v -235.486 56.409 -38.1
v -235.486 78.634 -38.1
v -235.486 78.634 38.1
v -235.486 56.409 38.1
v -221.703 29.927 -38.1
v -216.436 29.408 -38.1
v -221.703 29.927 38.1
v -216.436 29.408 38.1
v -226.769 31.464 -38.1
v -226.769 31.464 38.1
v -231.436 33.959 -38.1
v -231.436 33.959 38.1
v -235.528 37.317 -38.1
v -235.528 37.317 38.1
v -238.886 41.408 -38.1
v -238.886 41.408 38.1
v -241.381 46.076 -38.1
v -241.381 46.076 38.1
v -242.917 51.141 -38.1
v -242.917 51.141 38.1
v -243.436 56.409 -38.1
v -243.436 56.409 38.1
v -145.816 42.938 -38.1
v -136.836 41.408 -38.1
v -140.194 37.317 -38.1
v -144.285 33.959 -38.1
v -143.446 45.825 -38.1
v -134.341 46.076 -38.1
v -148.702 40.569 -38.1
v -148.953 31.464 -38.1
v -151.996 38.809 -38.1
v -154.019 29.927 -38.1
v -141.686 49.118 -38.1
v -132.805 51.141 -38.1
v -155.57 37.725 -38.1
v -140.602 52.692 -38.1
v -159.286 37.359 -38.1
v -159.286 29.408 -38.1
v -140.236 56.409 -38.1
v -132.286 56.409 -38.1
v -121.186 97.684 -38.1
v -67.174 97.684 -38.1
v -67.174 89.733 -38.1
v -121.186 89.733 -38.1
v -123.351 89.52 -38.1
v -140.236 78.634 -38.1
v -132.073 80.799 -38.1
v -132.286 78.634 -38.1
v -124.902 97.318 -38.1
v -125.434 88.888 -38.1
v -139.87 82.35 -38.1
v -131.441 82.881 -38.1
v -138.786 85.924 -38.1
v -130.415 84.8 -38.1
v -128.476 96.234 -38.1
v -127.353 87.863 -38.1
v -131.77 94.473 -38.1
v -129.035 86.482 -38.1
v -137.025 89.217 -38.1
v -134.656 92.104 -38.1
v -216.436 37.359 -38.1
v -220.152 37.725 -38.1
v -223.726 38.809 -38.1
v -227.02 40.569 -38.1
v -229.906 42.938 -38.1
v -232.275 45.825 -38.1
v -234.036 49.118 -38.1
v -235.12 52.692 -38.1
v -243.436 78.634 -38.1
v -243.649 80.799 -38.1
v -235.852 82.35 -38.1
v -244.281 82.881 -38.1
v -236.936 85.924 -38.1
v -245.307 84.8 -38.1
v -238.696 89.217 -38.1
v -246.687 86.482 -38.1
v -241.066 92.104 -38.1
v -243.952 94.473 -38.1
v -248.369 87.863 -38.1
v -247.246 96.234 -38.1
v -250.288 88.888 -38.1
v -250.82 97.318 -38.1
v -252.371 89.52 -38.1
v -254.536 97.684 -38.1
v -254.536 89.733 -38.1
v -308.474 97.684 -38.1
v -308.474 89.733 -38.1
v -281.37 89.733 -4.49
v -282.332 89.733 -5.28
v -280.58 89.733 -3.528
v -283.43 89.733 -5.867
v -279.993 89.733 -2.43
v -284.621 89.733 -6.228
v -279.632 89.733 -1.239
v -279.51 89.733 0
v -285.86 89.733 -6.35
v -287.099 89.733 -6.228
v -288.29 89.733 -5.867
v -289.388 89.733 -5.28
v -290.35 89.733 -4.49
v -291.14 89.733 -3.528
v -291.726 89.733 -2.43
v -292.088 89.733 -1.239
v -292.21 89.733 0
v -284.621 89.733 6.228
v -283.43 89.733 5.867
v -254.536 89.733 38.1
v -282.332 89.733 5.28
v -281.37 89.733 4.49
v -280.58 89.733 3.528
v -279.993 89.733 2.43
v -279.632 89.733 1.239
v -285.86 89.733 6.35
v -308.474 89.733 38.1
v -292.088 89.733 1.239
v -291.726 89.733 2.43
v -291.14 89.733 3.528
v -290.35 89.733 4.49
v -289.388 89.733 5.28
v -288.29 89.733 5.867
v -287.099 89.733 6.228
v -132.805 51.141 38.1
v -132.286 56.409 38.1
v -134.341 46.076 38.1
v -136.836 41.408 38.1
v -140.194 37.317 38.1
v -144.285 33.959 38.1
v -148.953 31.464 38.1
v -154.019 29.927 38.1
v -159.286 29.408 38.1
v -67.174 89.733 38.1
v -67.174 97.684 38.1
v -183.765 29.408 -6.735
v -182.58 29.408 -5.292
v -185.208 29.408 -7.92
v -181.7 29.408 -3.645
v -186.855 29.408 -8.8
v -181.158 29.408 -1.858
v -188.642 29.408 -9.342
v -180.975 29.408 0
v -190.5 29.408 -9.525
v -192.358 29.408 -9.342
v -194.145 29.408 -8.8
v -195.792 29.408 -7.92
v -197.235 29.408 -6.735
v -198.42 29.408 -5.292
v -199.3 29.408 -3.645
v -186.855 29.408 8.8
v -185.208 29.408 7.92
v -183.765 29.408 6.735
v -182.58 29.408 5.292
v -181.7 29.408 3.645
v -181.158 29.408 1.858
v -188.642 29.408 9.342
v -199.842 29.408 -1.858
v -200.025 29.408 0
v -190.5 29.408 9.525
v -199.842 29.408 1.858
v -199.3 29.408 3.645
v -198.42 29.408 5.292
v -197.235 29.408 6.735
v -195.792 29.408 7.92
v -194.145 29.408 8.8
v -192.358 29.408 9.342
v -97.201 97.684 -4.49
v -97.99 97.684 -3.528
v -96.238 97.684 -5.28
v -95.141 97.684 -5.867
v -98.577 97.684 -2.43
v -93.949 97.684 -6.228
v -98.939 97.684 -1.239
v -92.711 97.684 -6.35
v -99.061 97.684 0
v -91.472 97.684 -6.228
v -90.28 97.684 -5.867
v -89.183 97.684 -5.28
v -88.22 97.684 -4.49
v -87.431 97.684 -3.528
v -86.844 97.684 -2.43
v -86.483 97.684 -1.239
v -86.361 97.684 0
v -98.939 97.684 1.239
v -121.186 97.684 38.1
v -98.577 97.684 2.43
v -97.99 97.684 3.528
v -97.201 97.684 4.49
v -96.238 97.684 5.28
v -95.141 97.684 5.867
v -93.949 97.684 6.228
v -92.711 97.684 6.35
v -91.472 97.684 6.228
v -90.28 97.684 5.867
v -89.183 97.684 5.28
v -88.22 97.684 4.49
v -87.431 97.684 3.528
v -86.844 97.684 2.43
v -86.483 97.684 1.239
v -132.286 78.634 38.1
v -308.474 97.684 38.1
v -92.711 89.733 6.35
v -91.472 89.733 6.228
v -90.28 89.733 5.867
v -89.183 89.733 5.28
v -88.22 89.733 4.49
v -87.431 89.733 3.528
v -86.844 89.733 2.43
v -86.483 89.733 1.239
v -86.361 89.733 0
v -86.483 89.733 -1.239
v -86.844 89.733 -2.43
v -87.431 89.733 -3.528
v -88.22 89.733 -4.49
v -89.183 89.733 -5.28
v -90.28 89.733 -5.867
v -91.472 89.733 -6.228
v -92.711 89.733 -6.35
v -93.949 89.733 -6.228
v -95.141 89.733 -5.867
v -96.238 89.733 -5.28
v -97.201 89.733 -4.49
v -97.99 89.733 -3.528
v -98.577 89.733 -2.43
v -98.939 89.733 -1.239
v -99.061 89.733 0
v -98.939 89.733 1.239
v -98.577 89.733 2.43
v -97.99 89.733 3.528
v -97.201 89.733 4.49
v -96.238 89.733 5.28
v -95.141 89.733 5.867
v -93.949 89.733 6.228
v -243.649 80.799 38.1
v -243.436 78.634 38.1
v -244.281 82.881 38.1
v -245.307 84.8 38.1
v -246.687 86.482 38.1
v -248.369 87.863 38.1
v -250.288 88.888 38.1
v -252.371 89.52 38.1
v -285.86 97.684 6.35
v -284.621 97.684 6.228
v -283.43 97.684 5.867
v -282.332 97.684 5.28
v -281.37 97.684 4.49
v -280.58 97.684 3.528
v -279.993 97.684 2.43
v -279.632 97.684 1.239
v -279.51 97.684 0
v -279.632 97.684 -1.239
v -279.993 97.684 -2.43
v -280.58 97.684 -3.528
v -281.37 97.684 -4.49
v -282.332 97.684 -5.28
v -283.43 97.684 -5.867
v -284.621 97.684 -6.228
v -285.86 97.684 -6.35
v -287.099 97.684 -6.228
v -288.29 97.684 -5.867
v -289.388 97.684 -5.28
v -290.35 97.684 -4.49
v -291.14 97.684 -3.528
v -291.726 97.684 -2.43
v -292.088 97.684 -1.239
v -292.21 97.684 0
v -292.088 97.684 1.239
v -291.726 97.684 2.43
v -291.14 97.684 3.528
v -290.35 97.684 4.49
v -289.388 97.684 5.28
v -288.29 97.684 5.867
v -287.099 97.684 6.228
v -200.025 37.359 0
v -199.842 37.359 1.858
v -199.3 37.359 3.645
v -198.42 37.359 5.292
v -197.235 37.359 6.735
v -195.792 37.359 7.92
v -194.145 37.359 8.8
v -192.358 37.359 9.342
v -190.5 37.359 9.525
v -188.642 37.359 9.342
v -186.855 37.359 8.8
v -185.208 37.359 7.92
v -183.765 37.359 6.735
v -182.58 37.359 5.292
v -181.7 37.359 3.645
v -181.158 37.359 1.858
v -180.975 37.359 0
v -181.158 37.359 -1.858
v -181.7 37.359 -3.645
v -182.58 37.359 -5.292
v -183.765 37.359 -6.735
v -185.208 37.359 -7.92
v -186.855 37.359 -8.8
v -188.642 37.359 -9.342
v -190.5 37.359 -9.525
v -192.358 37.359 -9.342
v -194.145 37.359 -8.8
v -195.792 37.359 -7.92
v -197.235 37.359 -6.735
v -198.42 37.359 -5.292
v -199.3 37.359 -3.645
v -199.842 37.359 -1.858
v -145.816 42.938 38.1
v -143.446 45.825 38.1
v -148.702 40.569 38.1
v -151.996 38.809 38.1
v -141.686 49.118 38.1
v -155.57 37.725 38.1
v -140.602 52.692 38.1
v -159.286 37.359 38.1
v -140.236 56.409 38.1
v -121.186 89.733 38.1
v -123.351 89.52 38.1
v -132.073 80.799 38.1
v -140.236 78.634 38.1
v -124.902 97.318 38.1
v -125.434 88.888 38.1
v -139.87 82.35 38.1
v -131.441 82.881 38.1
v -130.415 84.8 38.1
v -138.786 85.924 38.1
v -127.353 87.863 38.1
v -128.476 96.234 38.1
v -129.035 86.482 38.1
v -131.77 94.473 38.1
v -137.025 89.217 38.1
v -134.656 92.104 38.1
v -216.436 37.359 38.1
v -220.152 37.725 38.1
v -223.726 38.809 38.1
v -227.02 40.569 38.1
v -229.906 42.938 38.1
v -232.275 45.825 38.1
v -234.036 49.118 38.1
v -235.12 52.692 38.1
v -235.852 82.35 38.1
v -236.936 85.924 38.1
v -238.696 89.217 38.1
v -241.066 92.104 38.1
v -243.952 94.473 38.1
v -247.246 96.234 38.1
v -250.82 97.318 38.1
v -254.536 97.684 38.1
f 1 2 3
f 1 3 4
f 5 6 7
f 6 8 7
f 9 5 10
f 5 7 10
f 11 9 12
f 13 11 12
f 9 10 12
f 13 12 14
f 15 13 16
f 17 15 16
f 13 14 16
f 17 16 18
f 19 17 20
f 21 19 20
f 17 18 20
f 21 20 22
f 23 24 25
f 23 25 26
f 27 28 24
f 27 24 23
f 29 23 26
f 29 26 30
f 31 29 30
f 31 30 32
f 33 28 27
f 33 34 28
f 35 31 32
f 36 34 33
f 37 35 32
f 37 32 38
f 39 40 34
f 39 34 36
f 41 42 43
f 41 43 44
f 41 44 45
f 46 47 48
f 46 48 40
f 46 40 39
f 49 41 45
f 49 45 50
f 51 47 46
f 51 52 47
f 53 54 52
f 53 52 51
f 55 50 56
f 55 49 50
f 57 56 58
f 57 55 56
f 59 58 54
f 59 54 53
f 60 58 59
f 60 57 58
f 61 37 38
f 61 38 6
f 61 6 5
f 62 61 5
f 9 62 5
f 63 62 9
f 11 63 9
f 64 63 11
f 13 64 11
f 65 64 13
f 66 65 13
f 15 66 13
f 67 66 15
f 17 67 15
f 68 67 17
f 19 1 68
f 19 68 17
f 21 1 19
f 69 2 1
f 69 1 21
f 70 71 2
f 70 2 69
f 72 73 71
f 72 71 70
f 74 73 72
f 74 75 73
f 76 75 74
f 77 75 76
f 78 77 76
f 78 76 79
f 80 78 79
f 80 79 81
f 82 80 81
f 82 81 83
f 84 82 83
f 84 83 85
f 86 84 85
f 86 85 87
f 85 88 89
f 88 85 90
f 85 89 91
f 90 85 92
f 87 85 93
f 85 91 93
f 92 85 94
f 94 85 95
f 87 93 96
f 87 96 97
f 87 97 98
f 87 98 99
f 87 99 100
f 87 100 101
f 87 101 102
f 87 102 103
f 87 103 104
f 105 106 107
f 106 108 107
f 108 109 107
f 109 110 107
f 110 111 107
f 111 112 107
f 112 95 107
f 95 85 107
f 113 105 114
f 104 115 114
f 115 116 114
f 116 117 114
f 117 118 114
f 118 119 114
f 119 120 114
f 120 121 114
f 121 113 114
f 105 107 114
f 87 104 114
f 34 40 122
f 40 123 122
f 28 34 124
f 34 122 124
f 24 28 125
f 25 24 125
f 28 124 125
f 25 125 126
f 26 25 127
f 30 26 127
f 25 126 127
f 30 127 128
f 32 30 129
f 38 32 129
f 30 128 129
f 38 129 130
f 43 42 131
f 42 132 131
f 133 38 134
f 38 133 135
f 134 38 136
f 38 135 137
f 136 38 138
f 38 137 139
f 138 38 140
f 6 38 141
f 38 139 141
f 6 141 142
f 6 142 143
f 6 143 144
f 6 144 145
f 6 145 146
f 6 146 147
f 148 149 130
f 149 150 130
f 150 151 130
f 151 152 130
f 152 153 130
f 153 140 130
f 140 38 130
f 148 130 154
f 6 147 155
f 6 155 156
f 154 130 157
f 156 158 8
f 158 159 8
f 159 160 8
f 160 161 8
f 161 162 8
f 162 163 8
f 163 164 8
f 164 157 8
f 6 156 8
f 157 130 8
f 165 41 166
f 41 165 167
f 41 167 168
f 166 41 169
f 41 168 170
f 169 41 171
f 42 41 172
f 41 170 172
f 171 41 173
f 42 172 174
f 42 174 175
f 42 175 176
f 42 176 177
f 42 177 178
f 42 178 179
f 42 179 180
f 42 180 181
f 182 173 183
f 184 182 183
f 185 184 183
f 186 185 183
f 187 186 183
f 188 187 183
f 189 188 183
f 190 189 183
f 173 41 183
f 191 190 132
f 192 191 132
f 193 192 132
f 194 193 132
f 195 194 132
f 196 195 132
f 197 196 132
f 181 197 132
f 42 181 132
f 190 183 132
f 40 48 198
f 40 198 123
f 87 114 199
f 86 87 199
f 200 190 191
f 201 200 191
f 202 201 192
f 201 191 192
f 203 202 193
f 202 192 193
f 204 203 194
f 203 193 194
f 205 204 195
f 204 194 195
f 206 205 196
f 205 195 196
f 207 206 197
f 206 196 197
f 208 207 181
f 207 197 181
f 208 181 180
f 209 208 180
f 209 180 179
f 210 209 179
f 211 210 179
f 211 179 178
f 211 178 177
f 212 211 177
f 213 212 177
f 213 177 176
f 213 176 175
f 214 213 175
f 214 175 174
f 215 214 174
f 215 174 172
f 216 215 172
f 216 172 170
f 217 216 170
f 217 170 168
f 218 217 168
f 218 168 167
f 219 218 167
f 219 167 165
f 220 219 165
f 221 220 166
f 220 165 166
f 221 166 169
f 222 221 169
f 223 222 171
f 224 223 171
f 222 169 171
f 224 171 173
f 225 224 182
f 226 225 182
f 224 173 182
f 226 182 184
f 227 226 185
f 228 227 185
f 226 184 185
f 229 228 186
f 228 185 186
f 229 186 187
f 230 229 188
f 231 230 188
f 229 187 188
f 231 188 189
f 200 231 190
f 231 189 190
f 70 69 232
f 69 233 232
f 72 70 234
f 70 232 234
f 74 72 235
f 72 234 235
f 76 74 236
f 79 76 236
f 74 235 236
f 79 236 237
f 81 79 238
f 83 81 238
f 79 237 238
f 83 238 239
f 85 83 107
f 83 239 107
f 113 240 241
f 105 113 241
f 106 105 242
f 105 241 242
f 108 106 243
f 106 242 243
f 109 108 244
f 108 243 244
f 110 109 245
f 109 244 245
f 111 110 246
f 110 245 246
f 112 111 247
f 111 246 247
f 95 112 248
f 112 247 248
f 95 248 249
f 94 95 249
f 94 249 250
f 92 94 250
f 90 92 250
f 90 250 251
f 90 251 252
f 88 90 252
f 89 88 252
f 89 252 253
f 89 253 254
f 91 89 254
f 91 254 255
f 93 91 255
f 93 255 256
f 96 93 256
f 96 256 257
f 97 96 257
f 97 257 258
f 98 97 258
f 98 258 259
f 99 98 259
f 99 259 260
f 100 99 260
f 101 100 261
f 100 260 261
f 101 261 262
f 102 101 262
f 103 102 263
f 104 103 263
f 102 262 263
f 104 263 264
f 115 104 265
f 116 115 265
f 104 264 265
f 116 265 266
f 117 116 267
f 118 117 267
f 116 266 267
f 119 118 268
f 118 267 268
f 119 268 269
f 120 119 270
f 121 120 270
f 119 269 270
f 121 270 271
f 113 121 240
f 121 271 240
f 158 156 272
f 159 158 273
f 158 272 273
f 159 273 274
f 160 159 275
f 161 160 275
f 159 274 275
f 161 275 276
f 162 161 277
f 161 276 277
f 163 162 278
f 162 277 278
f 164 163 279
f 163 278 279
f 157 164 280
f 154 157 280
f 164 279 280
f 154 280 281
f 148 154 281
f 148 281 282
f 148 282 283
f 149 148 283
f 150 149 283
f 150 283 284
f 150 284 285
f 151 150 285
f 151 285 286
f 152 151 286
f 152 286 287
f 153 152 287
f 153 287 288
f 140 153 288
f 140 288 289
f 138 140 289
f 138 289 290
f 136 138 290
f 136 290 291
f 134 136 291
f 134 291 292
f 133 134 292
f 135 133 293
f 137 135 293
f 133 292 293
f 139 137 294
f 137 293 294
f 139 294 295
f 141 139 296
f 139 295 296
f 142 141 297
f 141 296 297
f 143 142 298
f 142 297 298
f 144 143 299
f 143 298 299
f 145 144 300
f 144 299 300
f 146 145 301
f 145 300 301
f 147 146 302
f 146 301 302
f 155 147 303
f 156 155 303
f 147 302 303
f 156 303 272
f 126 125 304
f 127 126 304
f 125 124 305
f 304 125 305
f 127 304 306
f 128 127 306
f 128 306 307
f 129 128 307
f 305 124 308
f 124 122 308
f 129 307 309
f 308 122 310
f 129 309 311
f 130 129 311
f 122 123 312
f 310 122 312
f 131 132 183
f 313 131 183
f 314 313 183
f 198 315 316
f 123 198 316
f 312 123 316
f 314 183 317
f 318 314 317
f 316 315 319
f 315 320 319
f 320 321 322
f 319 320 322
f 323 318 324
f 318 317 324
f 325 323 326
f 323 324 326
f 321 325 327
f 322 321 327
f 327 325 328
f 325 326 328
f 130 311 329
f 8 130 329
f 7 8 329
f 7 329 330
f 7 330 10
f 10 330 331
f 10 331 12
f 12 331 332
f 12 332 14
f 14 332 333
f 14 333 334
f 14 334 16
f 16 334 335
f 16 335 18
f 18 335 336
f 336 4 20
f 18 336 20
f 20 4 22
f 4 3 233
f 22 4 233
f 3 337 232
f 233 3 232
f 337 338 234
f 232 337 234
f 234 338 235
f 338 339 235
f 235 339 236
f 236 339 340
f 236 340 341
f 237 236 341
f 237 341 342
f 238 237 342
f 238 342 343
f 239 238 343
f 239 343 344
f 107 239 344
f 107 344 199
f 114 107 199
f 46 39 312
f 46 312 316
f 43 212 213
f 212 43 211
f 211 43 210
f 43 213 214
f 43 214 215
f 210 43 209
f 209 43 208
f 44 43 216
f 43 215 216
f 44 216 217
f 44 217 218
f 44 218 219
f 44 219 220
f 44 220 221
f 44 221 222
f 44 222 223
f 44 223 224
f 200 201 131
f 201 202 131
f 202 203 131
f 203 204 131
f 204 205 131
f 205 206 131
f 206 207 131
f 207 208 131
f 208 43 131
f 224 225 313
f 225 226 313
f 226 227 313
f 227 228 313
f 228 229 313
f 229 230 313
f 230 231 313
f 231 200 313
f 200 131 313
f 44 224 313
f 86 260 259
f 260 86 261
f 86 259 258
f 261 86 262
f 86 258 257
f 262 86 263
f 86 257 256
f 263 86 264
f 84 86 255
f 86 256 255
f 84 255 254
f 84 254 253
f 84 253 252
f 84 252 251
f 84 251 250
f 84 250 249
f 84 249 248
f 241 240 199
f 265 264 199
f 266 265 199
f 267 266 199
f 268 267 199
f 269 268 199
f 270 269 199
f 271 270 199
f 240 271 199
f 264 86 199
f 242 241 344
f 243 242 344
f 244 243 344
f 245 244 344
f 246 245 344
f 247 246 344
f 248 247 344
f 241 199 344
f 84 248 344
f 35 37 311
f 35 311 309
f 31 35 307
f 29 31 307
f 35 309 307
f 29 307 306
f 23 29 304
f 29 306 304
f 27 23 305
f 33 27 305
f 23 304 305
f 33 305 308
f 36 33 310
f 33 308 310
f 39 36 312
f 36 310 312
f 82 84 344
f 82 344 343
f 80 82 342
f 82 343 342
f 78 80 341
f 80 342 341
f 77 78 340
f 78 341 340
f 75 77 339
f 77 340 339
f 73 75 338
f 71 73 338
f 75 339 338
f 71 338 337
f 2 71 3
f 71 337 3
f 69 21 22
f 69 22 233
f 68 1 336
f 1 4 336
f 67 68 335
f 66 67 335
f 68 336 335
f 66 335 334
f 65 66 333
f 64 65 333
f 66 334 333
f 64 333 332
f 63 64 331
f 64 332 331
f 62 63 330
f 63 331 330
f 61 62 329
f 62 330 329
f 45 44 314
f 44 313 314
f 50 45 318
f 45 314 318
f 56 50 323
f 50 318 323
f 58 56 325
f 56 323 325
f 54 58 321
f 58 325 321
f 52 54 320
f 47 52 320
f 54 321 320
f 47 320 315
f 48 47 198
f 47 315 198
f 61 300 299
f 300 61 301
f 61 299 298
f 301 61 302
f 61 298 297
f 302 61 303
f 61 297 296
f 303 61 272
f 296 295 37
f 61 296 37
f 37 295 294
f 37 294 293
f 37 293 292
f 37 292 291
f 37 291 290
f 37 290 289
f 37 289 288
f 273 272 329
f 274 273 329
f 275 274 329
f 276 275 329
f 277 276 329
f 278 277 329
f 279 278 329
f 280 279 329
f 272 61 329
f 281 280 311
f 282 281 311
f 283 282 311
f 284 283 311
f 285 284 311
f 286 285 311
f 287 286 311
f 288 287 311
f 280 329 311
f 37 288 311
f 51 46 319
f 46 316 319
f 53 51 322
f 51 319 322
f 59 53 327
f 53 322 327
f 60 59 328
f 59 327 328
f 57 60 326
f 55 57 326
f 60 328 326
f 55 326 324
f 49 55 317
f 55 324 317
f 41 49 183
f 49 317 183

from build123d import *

# Parameters (mm, degrees)
BOSS_EXTRUDE1_DEPTH = 38.1
SKETCH4_R           = 9.525
SKETCH4_R_2         = 6.35
CUT_EXTRUDE1_DEPTH  = 76.2


with BuildPart() as part:
    # Sketch3 → Boss-Extrude1 (new, symmetric)
    with BuildSketch(Plane.XY):
        with BuildLine():
            Line((-308.473797305, 97.683602722), (-254.535984299, 97.683602722))
            ThreePointArc((-254.535984299, 97.683602722), (-241.065600117, 92.103986904), (-235.485984299, 78.633602722))
            Line((-235.485984299, 78.633602722), (-235.485984299, 56.408602722))
            ThreePointArc((-235.485984299, 56.408602722), (-229.90636848, 42.938218541), (-216.435984299, 37.358602722))
            Line((-216.435984299, 37.358602722), (-159.285984299, 37.358602722))
            ThreePointArc((-159.285984299, 37.358602722), (-145.815600117, 42.938218541), (-140.235984299, 56.408602722))
            Line((-140.235984299, 56.408602722), (-140.235984299, 78.633602722))
            ThreePointArc((-140.235984299, 78.633602722), (-134.65636848, 92.103986904), (-121.185984299, 97.683602722))
            Line((-121.185984299, 97.683602722), (-67.173797305, 97.683602722))
            Line((-67.173797305, 97.683602722), (-67.173797305, 89.733402722))
            Line((-67.173797305, 89.733402722), (-121.185984299, 89.733402722))
            ThreePointArc((-121.185984299, 89.733402722), (-129.034728149, 86.482346572), (-132.285784299, 78.633602722))
            Line((-132.285784299, 78.633602722), (-132.285784299, 56.408602722))
            ThreePointArc((-132.285784299, 56.408602722), (-140.193959785, 37.316578209), (-159.285984299, 29.408402722))
            Line((-159.285984299, 29.408402722), (-216.435984299, 29.408402722))
            ThreePointArc((-216.435984299, 29.408402722), (-235.528008812, 37.316578209), (-243.436184299, 56.408602722))
            Line((-243.436184299, 56.408602722), (-243.436184299, 78.633602722))
            ThreePointArc((-243.436184299, 78.633602722), (-246.687240449, 86.482346572), (-254.535984299, 89.733402722))
            Line((-254.535984299, 89.733402722), (-308.473797305, 89.733402722))
            Line((-308.473797305, 89.733402722), (-308.473797305, 97.683602722))
        make_face()
    extrude(amount=BOSS_EXTRUDE1_DEPTH, both=True)

    # Sketch4 → Cut-Extrude1 (cut)
    with BuildSketch(Plane(origin=(0, 97.683602722, 0), x_dir=(1, 0, 0), z_dir=(0, 1, 0))):
        with Locations(Location((-190.5, 0, 0), (0, 0, 180))):
            Circle(SKETCH4_R)
        with Locations(Location((-285.859715502, 0, 0), (0, 0, 270))):
            Circle(SKETCH4_R_2)
        with Locations(Location((-92.710517543, 0, 0), (0, 0, 270))):
            Circle(SKETCH4_R_2)
    extrude(amount=-CUT_EXTRUDE1_DEPTH, mode=Mode.SUBTRACT)


solid = part.part
